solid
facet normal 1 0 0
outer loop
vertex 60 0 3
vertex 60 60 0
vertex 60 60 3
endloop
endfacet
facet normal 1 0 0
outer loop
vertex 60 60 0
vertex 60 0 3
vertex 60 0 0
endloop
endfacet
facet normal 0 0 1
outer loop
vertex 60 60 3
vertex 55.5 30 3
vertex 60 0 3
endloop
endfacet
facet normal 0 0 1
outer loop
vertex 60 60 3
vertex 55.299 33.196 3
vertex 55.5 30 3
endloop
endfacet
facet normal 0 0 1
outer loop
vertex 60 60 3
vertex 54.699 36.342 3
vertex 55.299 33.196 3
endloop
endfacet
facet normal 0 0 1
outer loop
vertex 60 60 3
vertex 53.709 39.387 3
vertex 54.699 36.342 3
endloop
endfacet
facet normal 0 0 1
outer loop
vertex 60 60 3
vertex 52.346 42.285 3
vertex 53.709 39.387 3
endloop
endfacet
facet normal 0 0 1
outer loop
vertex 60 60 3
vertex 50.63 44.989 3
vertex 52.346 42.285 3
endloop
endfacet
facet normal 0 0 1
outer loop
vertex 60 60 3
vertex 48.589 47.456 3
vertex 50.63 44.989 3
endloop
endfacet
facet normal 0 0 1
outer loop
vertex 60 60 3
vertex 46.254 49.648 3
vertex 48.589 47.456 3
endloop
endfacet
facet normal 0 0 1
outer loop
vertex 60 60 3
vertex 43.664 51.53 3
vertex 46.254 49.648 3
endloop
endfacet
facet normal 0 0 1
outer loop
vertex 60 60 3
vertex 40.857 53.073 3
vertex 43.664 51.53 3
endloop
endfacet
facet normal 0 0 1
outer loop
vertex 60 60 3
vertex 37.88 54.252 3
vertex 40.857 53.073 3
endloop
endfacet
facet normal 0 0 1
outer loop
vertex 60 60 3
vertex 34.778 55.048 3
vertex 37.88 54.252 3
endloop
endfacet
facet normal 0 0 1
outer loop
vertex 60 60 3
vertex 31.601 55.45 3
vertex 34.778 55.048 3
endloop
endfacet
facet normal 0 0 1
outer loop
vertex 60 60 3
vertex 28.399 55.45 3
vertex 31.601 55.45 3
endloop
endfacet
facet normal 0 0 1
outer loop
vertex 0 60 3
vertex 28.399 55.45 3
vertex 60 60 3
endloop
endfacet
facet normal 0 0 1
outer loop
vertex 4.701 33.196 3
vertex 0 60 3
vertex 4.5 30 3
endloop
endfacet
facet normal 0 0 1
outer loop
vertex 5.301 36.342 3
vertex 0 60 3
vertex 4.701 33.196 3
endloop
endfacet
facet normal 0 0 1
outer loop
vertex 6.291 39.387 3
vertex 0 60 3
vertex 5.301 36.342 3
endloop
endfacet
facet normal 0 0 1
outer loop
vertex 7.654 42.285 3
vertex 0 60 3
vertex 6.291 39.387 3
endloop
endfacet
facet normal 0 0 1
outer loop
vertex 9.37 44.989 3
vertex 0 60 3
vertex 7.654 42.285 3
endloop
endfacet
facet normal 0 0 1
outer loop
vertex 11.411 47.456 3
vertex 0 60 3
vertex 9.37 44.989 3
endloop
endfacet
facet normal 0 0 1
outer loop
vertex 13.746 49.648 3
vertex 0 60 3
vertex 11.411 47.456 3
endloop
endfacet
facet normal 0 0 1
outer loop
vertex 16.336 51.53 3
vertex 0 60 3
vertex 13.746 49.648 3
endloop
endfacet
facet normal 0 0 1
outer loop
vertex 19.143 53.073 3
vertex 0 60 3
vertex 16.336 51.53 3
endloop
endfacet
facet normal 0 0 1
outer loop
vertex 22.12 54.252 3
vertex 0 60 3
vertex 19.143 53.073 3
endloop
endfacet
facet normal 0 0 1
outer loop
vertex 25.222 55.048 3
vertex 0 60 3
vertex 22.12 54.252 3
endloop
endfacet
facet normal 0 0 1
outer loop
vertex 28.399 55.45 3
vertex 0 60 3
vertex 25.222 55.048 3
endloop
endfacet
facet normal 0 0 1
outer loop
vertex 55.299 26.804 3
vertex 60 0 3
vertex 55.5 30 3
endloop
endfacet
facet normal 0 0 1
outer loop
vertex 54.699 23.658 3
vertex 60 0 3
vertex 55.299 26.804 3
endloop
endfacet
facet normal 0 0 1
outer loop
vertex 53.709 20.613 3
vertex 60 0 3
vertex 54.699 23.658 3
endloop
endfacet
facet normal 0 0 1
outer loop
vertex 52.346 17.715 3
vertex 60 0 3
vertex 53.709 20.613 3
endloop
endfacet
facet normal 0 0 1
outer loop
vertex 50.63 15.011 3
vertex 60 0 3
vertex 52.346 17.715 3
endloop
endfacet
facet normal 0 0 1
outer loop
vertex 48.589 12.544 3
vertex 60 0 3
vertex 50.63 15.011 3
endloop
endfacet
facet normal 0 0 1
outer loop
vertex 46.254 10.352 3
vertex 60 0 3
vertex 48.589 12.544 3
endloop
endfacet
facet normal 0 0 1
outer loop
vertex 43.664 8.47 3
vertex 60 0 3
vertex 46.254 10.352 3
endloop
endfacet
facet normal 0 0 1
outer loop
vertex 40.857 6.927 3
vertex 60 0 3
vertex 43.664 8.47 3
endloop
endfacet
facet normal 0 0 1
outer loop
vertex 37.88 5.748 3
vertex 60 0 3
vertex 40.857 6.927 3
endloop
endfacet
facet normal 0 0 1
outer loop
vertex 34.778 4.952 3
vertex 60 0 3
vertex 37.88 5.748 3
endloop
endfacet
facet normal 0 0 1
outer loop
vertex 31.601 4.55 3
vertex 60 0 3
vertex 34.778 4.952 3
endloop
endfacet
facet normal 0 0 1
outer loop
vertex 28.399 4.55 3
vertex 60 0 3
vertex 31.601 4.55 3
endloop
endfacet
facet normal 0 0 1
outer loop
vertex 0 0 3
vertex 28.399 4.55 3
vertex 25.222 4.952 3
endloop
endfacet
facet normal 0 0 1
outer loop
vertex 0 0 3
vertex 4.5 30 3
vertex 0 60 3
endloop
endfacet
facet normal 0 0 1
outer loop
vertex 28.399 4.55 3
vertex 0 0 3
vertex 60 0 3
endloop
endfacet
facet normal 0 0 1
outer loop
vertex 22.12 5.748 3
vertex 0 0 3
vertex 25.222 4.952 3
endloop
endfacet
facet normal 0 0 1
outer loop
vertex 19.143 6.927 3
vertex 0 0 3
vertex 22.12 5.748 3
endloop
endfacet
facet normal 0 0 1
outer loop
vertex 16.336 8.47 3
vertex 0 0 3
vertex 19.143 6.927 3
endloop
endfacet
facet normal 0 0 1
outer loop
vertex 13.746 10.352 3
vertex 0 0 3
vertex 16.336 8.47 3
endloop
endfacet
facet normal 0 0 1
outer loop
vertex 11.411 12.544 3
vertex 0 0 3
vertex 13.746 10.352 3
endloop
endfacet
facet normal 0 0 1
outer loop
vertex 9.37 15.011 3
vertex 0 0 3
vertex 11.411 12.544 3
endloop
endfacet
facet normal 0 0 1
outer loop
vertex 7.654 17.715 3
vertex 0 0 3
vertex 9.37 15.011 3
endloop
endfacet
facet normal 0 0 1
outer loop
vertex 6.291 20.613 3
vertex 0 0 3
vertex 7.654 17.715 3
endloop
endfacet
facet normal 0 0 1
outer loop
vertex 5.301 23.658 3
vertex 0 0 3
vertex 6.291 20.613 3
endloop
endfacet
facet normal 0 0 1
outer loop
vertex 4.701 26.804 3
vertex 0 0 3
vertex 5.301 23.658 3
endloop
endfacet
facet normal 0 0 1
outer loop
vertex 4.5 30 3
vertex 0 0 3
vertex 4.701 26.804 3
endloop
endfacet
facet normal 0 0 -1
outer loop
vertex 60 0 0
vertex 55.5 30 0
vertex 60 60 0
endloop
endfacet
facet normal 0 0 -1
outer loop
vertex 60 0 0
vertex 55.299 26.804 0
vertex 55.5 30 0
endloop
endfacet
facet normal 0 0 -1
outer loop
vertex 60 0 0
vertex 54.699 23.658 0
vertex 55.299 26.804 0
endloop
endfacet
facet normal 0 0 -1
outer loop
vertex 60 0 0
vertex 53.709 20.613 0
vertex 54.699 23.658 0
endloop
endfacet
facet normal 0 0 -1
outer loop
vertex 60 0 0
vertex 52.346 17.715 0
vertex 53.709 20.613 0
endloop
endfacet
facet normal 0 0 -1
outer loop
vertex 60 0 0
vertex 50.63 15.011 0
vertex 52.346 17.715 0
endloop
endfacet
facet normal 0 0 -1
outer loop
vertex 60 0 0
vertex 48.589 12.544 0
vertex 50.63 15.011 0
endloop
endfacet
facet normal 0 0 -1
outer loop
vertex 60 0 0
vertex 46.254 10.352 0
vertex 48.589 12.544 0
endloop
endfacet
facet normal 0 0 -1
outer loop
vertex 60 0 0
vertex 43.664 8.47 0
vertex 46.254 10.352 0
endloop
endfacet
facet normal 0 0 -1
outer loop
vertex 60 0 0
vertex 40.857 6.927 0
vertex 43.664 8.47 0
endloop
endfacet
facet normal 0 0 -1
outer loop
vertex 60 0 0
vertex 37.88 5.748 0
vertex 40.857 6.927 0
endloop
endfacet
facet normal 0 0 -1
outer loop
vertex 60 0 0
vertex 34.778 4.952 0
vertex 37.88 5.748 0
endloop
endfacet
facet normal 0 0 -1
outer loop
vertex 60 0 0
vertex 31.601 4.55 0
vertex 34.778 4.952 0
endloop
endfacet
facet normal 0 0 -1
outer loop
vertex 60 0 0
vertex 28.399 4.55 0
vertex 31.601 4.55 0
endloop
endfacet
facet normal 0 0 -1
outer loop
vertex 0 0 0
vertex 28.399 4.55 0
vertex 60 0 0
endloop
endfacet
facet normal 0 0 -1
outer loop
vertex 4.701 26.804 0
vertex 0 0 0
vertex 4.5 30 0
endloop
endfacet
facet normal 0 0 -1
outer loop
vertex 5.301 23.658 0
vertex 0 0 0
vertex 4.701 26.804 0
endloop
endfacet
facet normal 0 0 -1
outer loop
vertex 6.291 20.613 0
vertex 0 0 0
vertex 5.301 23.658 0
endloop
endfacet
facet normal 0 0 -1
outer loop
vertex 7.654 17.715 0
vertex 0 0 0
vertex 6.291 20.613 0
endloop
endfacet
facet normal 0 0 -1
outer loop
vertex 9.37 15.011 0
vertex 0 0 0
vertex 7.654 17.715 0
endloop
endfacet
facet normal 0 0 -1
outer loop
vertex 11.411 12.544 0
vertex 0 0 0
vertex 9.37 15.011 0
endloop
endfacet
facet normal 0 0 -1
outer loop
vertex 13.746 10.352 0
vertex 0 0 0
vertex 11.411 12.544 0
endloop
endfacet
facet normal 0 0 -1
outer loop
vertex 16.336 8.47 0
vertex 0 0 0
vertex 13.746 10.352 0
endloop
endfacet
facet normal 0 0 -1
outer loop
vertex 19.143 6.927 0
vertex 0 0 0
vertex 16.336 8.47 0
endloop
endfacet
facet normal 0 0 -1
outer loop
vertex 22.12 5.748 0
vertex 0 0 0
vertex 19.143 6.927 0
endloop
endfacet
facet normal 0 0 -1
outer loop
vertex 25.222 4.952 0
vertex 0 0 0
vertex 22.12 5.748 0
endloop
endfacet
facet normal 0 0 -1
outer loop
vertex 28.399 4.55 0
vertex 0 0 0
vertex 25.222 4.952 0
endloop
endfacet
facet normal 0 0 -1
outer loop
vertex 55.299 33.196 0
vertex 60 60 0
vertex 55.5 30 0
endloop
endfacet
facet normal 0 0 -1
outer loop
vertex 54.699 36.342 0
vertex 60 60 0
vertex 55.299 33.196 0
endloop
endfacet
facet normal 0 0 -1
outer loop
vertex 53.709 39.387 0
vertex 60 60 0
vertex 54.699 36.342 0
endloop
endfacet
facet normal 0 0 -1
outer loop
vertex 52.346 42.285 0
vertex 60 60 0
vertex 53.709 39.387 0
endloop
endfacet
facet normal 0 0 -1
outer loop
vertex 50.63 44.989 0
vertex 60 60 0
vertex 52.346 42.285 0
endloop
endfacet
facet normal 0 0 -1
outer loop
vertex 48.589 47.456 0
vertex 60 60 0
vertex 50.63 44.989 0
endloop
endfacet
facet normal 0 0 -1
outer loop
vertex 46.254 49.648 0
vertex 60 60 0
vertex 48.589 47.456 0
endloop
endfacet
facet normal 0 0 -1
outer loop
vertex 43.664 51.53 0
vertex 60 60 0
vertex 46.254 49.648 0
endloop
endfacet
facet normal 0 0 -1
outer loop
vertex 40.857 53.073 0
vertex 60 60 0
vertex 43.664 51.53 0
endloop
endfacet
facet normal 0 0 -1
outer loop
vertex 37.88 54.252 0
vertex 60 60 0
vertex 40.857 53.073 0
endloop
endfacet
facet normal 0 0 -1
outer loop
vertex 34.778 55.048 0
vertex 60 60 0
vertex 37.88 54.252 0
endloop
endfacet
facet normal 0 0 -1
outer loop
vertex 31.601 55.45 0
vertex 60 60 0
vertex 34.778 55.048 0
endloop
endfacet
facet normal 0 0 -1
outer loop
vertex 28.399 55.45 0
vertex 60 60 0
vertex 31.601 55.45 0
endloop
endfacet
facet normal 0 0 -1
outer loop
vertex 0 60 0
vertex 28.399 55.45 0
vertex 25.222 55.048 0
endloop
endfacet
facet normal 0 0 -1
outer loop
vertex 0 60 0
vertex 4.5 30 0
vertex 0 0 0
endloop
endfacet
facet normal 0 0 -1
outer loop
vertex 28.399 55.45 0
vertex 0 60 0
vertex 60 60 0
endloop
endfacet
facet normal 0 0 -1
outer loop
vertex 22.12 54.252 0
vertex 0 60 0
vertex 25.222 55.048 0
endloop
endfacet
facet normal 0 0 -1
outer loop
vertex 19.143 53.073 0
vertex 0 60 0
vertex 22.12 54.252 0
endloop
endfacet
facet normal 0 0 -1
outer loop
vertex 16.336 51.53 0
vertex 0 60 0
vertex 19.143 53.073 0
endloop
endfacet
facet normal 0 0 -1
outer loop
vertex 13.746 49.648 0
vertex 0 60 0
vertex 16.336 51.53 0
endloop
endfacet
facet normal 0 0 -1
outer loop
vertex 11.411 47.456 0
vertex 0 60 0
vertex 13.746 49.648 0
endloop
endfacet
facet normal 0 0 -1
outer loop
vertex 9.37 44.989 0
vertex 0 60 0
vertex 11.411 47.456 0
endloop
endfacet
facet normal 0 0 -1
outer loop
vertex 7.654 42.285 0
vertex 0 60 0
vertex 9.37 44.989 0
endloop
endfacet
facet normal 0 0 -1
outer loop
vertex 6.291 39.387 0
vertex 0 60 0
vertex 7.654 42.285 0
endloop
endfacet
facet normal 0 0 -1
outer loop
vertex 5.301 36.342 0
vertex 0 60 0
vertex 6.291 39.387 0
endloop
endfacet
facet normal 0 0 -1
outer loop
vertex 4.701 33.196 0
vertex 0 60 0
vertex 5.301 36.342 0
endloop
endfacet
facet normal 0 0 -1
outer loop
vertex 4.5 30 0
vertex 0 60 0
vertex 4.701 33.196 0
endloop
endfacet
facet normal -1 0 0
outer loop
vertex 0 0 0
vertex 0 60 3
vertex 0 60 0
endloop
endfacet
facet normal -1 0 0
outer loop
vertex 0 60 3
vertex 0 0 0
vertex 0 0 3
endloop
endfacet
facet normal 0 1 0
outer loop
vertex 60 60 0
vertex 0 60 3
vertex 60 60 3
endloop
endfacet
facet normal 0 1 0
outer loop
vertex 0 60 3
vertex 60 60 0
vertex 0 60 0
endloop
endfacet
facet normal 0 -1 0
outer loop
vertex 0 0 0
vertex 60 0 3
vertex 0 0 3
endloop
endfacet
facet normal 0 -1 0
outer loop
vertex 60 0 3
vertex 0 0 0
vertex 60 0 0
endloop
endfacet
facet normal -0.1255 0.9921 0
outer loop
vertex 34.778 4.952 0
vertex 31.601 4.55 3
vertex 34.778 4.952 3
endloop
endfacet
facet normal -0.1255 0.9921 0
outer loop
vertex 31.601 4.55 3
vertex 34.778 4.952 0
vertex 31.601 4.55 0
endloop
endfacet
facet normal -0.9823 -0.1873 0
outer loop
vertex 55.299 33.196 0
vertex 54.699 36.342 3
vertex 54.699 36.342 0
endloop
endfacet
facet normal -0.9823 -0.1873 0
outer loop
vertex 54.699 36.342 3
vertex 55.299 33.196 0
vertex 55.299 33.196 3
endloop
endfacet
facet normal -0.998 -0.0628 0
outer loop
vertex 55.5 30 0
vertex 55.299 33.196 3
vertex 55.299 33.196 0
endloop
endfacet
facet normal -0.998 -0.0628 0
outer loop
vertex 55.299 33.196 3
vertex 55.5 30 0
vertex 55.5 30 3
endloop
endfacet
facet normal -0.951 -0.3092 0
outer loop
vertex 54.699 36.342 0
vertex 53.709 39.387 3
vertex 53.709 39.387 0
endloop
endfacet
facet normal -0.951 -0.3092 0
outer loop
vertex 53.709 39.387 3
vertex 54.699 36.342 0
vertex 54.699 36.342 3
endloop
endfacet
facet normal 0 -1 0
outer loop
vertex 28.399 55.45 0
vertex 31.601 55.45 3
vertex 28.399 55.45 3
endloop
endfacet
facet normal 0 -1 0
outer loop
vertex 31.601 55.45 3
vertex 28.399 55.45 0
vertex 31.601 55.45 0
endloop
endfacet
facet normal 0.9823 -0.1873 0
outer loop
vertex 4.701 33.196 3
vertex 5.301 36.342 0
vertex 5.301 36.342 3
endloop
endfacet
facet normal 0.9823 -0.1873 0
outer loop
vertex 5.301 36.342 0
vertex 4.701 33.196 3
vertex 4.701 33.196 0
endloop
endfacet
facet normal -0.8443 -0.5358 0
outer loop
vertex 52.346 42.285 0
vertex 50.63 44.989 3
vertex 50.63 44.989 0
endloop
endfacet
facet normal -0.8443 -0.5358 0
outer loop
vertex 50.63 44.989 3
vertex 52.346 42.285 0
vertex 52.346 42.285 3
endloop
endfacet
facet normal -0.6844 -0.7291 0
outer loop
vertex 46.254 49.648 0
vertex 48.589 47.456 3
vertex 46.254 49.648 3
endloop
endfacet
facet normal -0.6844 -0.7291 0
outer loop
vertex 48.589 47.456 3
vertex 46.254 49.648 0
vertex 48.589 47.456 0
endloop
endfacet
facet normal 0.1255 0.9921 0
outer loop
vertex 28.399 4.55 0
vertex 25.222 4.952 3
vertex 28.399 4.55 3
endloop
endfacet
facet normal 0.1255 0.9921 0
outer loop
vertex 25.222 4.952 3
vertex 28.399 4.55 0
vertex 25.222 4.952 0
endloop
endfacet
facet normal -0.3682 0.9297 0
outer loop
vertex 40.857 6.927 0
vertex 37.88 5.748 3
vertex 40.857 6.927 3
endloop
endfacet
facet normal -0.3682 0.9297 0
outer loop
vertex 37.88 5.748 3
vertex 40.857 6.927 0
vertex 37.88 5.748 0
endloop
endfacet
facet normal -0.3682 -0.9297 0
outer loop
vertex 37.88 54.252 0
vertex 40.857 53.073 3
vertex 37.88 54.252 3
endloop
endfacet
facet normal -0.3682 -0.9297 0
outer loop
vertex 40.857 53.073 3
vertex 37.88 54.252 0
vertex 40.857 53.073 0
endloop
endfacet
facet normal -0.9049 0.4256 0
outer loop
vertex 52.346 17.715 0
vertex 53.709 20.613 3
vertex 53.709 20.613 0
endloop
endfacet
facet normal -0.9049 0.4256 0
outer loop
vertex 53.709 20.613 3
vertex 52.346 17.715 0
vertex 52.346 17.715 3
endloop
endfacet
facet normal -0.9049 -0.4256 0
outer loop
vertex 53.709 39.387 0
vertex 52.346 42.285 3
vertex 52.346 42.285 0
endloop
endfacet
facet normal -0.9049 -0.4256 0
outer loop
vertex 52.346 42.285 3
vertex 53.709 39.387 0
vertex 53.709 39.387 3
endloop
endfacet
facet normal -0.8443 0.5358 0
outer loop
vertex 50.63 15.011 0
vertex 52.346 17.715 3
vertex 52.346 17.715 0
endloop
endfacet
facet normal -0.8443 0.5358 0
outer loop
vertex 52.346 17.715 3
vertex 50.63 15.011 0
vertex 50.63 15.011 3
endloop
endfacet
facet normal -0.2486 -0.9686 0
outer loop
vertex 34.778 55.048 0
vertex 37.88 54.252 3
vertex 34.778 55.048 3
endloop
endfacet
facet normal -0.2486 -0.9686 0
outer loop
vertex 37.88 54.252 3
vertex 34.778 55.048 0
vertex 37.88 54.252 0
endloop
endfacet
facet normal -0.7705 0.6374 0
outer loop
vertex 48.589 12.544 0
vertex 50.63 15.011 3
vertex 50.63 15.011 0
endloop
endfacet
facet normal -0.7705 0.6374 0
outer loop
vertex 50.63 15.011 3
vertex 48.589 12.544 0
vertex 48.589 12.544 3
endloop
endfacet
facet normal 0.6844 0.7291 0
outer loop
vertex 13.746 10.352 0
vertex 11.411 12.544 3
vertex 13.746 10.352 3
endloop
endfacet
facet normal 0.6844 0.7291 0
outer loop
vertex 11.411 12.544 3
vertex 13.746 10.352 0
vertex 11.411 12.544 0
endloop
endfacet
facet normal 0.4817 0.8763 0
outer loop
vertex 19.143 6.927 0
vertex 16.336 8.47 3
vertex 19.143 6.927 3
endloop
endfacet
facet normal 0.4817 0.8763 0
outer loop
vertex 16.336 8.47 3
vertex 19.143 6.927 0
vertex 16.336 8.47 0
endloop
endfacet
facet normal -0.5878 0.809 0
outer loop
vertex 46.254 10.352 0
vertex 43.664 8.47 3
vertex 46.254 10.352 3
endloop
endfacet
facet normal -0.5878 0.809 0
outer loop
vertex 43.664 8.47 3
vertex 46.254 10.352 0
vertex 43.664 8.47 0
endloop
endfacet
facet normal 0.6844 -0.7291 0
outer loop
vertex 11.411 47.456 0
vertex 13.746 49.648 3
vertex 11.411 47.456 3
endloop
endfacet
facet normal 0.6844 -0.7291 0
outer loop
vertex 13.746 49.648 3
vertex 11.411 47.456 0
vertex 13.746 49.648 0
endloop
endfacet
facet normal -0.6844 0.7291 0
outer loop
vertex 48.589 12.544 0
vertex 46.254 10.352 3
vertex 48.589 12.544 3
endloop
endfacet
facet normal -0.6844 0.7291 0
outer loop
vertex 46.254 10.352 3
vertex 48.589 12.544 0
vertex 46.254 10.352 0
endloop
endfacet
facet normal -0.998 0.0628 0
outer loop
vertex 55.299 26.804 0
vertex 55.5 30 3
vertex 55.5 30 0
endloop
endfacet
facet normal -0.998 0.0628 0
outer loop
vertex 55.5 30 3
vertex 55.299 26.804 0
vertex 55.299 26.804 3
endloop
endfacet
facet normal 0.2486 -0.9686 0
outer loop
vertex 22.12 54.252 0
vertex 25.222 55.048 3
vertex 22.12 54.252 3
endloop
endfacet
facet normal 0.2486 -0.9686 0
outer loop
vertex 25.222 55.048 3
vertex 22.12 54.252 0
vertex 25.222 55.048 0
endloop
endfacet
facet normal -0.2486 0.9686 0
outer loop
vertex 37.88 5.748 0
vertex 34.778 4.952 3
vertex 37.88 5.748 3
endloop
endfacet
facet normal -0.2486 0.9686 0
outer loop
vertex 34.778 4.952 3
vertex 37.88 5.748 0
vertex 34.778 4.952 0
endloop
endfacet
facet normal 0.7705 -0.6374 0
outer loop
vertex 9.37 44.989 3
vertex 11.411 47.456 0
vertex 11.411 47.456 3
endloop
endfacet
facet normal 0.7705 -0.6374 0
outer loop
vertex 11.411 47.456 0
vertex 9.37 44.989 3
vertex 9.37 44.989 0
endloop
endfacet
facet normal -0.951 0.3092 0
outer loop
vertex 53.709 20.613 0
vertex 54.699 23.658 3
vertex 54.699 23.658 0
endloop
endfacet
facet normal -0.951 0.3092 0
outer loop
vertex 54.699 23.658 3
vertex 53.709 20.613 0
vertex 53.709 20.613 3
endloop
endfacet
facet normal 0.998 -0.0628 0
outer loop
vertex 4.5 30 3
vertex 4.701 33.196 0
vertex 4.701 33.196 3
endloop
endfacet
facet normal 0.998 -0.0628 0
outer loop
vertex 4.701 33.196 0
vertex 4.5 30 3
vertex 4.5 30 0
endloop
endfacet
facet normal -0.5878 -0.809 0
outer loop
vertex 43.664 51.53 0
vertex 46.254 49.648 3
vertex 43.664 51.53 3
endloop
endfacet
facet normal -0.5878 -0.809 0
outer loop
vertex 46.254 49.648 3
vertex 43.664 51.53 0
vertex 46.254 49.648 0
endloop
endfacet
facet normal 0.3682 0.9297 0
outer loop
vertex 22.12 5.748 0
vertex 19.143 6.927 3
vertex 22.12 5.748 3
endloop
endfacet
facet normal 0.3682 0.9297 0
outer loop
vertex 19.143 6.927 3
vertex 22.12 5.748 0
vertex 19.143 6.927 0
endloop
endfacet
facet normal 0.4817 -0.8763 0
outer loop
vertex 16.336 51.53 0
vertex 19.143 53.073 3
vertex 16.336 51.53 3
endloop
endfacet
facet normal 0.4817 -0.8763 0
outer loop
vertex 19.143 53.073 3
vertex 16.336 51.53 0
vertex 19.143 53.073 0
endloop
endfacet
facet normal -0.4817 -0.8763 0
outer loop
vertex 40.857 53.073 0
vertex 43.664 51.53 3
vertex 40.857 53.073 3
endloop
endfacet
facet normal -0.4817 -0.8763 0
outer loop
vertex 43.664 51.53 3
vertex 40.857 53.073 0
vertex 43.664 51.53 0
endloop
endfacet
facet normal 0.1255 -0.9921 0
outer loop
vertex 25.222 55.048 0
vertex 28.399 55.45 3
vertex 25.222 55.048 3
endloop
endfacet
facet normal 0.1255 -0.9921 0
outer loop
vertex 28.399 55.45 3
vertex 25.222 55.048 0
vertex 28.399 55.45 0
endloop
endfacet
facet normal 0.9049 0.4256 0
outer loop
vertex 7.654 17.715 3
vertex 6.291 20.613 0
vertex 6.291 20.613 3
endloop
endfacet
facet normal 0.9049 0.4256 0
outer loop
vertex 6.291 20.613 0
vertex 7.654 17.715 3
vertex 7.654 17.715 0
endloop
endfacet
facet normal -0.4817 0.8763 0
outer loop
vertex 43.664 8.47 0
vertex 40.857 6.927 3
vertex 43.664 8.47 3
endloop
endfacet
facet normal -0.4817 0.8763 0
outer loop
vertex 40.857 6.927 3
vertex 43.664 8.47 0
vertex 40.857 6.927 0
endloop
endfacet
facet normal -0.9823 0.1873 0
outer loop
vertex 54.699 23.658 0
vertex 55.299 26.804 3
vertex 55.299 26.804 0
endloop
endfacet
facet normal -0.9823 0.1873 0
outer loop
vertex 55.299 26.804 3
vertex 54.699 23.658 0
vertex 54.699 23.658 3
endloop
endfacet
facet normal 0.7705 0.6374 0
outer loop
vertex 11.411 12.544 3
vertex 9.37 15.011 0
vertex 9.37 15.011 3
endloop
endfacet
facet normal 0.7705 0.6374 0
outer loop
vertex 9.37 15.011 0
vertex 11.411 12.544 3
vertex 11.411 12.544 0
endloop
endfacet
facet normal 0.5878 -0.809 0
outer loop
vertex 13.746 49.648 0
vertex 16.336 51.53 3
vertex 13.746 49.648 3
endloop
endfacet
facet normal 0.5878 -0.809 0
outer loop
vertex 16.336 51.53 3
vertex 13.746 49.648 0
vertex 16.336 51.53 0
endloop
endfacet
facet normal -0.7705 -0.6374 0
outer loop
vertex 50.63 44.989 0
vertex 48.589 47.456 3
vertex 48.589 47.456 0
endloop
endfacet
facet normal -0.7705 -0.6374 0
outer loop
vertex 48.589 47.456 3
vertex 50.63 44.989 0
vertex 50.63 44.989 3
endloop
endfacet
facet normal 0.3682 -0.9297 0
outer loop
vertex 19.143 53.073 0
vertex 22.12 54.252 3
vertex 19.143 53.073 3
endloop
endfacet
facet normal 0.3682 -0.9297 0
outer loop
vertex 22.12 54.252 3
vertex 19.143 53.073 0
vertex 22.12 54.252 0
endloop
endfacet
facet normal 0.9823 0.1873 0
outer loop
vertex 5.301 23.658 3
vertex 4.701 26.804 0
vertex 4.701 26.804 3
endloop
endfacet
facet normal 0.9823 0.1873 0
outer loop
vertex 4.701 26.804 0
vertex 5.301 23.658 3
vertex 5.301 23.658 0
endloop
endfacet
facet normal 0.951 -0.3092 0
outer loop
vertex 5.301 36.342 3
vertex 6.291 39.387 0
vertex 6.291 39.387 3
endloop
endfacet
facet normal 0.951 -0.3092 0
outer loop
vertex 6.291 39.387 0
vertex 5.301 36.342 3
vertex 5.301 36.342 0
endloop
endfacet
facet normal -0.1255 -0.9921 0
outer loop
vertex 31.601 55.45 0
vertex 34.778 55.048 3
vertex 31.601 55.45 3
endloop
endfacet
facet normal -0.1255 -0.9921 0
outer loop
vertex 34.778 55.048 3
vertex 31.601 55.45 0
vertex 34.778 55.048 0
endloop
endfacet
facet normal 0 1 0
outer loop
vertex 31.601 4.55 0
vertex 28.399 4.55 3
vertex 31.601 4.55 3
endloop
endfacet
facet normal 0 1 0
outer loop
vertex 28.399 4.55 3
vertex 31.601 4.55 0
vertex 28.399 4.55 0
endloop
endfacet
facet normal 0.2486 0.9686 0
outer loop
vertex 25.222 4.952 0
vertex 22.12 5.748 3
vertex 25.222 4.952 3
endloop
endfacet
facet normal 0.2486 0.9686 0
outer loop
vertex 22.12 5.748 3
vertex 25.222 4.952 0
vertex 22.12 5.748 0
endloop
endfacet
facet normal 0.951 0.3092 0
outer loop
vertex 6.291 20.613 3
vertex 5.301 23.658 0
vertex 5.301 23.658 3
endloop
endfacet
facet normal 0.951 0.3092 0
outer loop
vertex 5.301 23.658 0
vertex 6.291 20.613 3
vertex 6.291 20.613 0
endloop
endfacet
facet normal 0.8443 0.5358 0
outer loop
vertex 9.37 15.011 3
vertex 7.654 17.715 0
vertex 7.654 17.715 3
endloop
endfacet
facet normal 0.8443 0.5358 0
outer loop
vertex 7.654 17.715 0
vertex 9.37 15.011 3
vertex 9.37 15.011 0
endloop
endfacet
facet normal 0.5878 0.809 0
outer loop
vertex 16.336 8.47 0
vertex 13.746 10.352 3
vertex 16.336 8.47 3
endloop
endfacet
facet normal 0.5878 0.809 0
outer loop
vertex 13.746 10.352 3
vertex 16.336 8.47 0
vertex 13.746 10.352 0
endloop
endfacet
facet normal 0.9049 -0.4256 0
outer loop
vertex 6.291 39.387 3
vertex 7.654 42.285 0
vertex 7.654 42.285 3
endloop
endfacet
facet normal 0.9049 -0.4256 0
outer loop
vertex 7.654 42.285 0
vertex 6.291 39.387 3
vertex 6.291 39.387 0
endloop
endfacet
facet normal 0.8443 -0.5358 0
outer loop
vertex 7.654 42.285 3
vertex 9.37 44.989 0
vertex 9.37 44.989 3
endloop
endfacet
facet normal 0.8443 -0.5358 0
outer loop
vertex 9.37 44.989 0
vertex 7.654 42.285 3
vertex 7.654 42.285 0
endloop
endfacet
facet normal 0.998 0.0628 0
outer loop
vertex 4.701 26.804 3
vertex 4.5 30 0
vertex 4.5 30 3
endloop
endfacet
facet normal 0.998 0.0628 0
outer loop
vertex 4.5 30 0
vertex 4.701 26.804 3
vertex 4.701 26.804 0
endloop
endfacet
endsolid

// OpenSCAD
$fn=50;

difference(){
cube([60,60,3]);
    translate([30,30,0])
cylinder(r=25.5,h=4);
}
